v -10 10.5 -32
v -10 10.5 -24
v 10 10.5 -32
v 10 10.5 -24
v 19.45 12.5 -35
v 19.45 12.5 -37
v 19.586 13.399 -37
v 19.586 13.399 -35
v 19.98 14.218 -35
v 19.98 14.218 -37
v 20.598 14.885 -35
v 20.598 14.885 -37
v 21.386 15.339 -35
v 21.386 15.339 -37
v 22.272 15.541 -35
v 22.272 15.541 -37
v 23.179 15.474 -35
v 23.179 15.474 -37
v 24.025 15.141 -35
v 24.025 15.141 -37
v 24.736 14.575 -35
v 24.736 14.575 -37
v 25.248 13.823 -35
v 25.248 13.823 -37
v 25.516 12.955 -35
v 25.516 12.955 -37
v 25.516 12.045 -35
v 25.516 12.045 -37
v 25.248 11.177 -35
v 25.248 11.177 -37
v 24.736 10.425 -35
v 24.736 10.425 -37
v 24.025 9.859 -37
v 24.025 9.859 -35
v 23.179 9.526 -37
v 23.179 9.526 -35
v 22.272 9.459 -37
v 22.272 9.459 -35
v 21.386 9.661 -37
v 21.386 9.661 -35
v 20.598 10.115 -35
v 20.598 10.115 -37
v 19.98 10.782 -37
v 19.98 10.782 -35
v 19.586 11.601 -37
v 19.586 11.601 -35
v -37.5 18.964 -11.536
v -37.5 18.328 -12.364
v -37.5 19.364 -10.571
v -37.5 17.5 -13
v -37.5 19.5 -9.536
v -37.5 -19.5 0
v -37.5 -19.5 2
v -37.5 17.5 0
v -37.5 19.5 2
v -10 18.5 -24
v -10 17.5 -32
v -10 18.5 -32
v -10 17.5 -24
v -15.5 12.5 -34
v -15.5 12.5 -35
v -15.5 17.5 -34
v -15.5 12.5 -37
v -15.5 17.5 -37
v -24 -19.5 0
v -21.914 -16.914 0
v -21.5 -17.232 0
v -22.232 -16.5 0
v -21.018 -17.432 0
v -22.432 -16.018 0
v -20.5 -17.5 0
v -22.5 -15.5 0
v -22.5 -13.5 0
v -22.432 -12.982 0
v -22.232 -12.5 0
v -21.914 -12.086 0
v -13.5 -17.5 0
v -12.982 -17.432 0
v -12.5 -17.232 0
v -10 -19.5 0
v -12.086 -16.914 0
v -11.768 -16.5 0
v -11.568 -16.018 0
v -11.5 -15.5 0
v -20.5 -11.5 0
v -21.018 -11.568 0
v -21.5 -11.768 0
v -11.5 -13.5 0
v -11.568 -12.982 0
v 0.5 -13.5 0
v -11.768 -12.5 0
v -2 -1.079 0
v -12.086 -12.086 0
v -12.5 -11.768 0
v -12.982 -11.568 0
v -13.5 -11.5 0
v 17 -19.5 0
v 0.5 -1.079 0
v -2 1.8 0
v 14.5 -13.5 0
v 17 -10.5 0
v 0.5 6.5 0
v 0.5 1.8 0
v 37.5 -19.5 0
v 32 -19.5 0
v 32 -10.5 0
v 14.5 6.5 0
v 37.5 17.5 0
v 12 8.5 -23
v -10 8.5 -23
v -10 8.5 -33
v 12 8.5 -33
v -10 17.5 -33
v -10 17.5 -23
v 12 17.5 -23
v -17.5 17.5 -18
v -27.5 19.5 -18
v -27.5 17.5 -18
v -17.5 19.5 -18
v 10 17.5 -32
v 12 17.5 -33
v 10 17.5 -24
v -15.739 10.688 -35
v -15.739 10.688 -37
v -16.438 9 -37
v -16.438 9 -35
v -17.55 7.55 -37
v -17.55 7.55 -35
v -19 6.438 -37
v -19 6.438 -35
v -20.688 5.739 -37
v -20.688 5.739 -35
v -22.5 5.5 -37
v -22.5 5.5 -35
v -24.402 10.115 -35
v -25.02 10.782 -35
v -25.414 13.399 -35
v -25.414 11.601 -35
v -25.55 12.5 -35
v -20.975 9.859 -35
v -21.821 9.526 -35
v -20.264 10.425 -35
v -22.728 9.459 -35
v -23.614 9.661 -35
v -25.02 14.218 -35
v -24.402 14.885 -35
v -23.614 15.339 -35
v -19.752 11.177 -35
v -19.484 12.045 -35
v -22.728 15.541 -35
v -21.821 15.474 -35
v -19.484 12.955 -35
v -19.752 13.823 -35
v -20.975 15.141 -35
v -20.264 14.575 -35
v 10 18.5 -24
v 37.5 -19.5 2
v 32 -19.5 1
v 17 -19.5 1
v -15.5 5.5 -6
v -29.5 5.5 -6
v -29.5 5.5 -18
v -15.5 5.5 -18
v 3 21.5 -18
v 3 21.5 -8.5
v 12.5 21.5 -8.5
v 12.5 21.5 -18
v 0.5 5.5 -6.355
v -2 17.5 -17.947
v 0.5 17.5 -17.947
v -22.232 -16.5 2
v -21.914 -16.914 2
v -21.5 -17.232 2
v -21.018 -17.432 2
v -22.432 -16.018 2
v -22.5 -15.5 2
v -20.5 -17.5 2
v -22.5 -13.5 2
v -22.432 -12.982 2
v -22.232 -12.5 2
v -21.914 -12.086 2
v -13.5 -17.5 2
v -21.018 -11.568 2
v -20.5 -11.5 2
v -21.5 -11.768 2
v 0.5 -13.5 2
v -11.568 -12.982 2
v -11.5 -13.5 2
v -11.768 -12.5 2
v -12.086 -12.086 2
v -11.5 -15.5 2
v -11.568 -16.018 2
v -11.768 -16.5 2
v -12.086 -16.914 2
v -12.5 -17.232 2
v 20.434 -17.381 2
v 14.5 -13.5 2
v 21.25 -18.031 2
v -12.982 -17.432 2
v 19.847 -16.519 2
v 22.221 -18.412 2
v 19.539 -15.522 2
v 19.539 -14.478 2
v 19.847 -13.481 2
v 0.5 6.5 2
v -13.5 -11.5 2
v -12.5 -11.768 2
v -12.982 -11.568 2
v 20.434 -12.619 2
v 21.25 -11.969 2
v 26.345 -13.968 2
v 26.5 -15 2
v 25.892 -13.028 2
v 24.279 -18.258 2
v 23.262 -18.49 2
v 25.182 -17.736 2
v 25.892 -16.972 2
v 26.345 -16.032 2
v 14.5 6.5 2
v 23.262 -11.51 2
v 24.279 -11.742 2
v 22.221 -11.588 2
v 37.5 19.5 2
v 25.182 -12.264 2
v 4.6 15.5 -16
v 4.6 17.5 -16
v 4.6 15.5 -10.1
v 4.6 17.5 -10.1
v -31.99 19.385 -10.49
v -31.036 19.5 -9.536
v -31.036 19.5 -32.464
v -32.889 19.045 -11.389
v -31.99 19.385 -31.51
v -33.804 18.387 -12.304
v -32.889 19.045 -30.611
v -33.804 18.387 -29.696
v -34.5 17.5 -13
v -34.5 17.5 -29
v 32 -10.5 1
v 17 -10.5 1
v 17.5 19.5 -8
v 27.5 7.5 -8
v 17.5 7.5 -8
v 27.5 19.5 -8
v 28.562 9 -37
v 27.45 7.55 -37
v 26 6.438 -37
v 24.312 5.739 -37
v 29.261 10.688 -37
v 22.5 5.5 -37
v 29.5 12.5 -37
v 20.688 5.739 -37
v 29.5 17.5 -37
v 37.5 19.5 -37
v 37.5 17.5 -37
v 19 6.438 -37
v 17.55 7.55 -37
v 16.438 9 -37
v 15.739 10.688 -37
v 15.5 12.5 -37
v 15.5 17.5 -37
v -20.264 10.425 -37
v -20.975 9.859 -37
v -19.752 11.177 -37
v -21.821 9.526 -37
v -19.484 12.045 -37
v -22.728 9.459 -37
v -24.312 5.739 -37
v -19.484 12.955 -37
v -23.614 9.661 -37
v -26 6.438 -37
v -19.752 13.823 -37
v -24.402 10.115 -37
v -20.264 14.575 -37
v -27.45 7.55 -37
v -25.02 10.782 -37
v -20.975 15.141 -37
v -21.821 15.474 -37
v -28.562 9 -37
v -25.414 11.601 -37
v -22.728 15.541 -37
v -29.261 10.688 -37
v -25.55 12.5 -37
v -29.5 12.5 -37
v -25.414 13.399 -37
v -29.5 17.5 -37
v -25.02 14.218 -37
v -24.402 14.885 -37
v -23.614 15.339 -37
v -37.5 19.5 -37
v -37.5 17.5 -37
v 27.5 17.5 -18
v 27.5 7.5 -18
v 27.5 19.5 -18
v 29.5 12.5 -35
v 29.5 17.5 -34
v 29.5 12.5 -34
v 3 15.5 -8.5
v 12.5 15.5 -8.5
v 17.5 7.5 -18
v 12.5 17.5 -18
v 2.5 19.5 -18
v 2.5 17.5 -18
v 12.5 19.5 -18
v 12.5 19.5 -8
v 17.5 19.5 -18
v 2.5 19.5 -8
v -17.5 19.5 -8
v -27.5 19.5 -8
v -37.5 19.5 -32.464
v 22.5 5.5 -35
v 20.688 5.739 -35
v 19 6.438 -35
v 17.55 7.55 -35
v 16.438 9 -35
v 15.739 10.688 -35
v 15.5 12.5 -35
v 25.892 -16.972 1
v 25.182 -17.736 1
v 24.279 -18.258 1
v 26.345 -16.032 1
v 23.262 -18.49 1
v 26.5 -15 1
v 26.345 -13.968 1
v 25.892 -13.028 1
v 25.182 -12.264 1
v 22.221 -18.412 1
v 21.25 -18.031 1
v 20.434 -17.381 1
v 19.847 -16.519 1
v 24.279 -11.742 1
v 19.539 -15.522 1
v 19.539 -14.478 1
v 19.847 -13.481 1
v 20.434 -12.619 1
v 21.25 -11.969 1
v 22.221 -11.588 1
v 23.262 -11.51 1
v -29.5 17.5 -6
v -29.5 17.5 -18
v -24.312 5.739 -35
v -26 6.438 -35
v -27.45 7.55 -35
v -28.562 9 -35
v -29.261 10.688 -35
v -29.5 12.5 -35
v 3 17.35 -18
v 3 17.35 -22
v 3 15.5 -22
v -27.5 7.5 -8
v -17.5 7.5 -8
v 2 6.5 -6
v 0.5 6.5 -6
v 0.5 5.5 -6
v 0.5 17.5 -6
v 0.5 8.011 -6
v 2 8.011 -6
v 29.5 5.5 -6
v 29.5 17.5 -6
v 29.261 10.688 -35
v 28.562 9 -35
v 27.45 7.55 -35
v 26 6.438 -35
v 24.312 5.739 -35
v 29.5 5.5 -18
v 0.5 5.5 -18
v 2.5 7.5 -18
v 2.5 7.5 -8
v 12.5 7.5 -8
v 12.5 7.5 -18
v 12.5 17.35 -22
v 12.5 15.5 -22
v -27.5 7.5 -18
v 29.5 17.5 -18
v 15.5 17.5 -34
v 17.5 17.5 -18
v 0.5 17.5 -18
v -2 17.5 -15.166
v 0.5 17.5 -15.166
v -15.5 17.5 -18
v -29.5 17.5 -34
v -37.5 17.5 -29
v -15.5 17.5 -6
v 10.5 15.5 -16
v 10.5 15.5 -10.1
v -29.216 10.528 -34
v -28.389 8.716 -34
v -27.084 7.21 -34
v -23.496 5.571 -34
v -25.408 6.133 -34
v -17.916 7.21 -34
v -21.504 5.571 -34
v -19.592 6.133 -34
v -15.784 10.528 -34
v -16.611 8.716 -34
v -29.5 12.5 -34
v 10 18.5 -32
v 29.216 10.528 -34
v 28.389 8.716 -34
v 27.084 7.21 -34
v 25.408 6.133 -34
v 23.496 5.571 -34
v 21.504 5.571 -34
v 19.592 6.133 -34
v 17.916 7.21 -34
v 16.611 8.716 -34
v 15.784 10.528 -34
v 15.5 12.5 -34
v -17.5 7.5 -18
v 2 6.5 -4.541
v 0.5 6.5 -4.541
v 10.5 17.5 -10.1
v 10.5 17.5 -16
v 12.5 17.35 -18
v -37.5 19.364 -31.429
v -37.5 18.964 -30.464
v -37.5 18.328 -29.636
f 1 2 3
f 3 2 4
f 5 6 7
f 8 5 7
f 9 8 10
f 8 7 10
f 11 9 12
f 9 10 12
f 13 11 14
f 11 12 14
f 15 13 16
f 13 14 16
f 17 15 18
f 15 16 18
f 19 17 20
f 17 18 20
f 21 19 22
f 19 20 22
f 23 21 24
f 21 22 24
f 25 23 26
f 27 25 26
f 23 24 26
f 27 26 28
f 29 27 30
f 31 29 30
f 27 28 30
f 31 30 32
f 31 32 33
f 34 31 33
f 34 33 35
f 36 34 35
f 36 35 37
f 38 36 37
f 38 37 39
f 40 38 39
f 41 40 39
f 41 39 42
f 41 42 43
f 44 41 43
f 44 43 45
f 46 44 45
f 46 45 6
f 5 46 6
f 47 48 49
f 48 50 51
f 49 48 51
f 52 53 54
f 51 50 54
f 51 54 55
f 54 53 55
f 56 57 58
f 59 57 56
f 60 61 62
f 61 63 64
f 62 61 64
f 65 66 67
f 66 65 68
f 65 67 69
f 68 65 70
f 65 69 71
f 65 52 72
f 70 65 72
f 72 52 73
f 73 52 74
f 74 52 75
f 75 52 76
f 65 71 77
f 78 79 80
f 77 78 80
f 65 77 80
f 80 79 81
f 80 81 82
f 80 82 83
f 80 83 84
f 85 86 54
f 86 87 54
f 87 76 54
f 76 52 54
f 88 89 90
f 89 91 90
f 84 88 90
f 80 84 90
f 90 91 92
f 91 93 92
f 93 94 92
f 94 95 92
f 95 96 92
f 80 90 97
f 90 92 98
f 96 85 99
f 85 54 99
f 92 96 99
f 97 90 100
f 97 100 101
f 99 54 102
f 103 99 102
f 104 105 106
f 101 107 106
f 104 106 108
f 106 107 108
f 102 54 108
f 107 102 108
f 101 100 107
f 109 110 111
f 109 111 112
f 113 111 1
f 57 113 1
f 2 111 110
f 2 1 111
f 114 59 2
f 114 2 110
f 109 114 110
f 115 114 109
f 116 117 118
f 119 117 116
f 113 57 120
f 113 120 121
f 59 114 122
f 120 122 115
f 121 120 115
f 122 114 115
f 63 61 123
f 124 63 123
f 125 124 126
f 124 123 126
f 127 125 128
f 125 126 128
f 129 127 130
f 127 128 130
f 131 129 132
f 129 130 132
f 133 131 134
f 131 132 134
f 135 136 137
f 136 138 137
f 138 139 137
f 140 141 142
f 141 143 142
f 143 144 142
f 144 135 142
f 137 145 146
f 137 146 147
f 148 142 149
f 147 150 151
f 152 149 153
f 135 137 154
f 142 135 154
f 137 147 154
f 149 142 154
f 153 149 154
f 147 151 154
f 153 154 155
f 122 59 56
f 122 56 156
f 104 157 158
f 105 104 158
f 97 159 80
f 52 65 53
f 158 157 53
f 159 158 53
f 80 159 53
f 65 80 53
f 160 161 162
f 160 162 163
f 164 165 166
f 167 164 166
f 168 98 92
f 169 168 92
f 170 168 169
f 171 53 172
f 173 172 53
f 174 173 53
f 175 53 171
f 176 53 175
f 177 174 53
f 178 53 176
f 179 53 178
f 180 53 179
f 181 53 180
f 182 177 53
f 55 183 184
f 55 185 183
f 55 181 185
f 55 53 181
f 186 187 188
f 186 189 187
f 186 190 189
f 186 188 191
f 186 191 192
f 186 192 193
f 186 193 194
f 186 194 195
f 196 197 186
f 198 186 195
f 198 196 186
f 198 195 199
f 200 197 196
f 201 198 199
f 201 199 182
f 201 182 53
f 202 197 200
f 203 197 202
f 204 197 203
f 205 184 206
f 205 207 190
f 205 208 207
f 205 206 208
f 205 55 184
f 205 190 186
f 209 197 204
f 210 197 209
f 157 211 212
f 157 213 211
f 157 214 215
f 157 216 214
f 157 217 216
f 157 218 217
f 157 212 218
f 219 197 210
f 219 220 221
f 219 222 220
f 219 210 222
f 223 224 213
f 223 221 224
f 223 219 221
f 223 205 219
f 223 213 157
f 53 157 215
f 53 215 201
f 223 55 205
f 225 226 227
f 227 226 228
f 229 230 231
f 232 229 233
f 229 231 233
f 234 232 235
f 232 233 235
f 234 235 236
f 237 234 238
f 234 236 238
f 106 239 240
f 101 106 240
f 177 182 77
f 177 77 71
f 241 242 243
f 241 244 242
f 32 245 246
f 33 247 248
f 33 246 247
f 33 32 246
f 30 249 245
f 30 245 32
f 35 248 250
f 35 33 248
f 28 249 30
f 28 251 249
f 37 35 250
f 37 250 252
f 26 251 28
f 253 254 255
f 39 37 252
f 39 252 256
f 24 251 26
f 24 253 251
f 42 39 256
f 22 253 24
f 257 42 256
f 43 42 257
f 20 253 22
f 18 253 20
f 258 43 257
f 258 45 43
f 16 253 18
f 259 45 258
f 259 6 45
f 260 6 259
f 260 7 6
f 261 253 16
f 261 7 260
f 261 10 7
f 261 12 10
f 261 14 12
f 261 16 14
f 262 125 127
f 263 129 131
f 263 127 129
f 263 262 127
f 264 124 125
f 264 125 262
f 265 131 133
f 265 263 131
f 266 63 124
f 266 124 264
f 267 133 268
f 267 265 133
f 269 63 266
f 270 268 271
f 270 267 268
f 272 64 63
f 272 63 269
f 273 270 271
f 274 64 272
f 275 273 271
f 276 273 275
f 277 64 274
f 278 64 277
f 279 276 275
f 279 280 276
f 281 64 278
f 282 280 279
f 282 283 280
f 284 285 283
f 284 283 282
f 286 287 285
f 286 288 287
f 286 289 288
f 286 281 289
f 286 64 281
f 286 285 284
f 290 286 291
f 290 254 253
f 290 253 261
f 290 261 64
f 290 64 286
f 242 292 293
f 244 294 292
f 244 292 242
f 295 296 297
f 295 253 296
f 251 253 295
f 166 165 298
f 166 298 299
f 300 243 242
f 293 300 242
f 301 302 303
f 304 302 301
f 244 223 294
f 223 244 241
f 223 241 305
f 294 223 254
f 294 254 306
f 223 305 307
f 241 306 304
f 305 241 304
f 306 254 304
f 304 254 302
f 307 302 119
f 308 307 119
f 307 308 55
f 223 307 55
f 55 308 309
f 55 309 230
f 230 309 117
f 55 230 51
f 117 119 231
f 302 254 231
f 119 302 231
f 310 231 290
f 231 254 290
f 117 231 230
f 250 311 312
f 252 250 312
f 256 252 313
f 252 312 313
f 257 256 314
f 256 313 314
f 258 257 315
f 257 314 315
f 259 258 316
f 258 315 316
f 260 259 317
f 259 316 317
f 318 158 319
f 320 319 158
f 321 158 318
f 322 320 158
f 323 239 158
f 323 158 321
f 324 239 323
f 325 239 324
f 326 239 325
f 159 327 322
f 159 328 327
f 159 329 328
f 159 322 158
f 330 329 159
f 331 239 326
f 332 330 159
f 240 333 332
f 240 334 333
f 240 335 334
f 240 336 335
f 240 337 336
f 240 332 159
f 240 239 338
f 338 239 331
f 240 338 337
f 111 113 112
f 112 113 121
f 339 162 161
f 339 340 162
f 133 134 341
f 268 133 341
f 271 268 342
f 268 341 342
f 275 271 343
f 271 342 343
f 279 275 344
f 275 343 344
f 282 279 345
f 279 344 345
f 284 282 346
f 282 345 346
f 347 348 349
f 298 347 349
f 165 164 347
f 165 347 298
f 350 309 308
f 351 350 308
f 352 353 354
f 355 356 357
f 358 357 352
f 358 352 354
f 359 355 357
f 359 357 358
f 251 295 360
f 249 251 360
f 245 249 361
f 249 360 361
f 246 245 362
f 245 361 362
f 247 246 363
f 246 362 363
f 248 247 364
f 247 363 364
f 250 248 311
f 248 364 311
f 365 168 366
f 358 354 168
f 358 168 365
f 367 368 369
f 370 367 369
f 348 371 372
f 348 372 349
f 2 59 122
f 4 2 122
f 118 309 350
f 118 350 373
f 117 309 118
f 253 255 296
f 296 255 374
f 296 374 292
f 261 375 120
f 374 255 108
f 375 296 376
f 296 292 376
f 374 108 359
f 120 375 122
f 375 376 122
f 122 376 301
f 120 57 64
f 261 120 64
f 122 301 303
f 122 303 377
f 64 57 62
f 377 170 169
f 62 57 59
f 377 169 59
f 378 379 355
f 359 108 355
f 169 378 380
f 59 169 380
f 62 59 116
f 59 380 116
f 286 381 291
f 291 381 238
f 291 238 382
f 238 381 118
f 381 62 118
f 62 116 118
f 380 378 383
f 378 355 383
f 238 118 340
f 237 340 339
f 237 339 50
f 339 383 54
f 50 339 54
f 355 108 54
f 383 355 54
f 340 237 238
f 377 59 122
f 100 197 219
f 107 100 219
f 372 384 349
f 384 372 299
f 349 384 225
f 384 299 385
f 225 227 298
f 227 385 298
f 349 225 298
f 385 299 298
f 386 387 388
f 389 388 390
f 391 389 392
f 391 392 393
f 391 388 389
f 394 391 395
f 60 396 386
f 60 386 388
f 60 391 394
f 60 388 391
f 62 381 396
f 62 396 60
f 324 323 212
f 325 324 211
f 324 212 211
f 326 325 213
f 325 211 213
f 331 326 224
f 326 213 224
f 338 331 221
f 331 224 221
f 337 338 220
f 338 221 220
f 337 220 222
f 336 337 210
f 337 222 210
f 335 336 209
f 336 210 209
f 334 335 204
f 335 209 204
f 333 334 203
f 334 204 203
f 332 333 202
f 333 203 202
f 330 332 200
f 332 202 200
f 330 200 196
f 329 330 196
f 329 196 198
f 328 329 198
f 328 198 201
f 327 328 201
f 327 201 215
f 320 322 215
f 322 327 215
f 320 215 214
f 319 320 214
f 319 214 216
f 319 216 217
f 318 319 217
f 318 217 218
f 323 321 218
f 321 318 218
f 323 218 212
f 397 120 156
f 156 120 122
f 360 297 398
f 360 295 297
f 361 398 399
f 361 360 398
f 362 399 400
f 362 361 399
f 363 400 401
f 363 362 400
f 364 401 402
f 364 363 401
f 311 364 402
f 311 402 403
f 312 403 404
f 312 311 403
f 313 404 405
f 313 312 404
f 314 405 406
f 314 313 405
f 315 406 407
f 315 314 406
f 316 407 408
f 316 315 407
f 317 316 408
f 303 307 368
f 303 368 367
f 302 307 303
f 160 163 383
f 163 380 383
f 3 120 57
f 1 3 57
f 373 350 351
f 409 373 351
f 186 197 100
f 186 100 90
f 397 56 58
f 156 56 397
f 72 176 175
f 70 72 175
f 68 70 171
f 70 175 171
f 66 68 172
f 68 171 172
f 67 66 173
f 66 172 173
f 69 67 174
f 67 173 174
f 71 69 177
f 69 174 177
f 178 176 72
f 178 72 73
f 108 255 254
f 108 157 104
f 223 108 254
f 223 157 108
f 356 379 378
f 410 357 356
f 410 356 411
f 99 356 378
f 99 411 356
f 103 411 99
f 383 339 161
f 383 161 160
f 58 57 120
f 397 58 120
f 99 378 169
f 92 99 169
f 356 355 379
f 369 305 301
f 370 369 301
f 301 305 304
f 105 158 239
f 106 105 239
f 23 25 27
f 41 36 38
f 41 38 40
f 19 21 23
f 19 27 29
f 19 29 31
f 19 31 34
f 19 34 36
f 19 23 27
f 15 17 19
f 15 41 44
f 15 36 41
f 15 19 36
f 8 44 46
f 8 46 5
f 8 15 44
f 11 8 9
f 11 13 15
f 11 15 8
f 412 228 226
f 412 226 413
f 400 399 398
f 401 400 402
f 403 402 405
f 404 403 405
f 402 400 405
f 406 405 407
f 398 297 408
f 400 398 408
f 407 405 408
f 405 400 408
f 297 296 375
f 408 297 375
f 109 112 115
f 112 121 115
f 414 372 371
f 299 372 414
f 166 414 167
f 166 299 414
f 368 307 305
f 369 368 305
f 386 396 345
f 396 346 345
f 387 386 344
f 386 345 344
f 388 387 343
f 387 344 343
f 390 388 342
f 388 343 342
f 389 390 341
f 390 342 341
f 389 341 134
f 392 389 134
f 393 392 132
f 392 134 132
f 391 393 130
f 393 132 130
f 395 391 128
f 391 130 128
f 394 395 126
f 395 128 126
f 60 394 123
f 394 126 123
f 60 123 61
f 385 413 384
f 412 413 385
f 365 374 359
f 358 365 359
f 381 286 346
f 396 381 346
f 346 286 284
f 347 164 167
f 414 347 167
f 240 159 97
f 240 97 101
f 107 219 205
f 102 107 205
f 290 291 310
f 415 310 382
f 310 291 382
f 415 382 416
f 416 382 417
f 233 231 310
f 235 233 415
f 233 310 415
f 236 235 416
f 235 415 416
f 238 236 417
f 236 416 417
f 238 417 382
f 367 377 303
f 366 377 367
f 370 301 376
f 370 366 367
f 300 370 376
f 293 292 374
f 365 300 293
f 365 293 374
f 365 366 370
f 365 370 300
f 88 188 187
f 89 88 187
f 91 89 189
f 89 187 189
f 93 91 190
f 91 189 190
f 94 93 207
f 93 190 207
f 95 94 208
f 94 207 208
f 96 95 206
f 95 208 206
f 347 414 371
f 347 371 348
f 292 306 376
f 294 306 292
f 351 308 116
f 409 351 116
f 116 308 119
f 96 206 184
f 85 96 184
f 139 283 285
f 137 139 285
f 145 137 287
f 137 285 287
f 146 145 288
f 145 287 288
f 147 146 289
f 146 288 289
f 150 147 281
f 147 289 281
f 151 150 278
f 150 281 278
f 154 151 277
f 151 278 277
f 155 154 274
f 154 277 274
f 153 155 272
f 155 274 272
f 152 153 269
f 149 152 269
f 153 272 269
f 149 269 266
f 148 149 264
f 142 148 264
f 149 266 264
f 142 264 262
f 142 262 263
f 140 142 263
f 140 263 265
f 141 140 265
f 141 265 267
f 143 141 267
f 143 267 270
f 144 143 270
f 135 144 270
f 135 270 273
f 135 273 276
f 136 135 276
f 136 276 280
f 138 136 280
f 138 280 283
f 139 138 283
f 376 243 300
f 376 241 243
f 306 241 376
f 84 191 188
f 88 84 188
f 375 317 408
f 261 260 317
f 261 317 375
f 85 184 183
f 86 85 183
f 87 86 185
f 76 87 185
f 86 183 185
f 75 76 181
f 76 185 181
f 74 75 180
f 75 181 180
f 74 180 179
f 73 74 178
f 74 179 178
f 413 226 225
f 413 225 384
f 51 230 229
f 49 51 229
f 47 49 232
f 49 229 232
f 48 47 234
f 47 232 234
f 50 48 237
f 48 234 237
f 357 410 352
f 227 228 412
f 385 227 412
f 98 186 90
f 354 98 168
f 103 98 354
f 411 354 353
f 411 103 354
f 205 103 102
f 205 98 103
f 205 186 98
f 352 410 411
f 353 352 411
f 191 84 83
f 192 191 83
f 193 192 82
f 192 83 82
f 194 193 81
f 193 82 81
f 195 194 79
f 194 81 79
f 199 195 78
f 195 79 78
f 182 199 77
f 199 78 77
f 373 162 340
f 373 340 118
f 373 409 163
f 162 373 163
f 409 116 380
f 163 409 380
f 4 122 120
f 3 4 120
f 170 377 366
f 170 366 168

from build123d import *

# Parameters (mm, degrees)
SKETCH1_W                 = 75
SKETCH1_H                 = 39
BOSS_EXTRUDE1_DEPTH       = 2
SKETCH2_W                 = 75
SKETCH2_H                 = 2
BOSS_EXTRUDE2_DEPTH       = 38
SKETCH4_R                 = 3.5
SKETCH4_R_2               = 2.25
SKETCH4_W                 = 11
SKETCH4_H                 = 6
CUT_EXTRUDE1_DEPTH        = 2
SKETCH6_W                 = 10
SKETCH6_H                 = 10
CUT_EXTRUDE2_DEPTH        = 2
BOSS_EXTRUDE3_DEPTH       = 10
SKETCH8_W                 = 14
SKETCH8_H                 = 12
BOSS_EXTRUDE4_DEPTH       = 2
SKETCH9_W                 = 10
SKETCH9_H                 = 10
BOSS_EXTRUDE5_DEPTH       = 4
SKETCH10_W                = 9.9
SKETCH10_H                = 9.9
SKETCH10_W_2              = 5.9
SKETCH10_H_2              = 5.9
BOSS_EXTRUDE9_DEPTH       = 2
SKETCH11_W                = 9.9
SKETCH11_H                = 1.85
BOSS_EXTRUDE10_DEPTH      = 4
SKETCH12_R                = 4.25
SKETCH12_R_2              = 2.25
BOSS_EXTRUDE11_DEPTH      = 2
SKETCH16_W                = 14
SKETCH16_H                = 9.5
SKETCH16_W_2              = 11
SKETCH16_H_2              = 6
BOSS_EXTRUDE13_DEPTH      = 2
CUT_EXTRUDE3_DEPTH        = 65.955754172
FILLET1_R                 = 2
FILLET2_R                 = 2
BOSS_EXTRUDE14_DEPTH      = 2
BOSS_EXTRUDE14_DEPTH_BACK = 2
CUT_EXTRUDE4_DEPTH        = 7
CUT_EXTRUDE4_DEPTH_BACK   = 10
SKETCH19_W                = 14
SKETCH19_H                = 20
SKETCH22_W                = 14
SKETCH22_H                = 14
BOSS_EXTRUDE15_DEPTH      = 3
FILLET3_R                 = 7
SKETCH23_R                = 3.05
CUT_EXTRUDE6_DEPTH        = 4
SKETCH24_W                = 1
SKETCH24_H                = 12
BOSS_EXTRUDE16_DEPTH      = 12
SKETCH25_W                = 16.318850604
SKETCH25_H                = 8.975597068
SKETCH25_W_2              = 14
SKETCH25_H_2              = 9.692484115
CUT_EXTRUDE7_DEPTH        = 2
CUT_EXTRUDE8_START        = -2
SKETCH26_R                = 4.25
CUT_EXTRUDE8_DEPTH        = 2
SKETCH27_R                = 2.25
BOSS_EXTRUDE17_DEPTH      = 2
SKETCH28_W                = 85.525995753
SKETCH28_H                = 26.786934063
CUT_EXTRUDE9_DEPTH        = 1
BOSS_EXTRUDE18_DEPTH      = 1
CUT_EXTRUDE10_DEPTH       = 10
CUT_EXTRUDE11_START       = -1
SKETCH31_W                = 15
SKETCH31_H                = 9
SKETCH31_R                = 3.5
CUT_EXTRUDE11_DEPTH       = 1
SKETCH32_W                = 20
SKETCH32_H                = 8
CUT_EXTRUDE12_DEPTH       = 1
BOSS_EXTRUDE19_START      = -1
SKETCH34_W                = 14
SKETCH34_H                = 1
BOSS_EXTRUDE19_DEPTH      = 1
SKETCH35_W                = 3
SKETCH35_H                = 16
CUT_EXTRUDE13_DEPTH       = 66.545785524
FILLET4_R                 = 4
SKETCH36_W                = 0.4
SKETCH36_H                = 4
CUT_EXTRUDE14_DEPTH       = 10
BOSS_EXTRUDE20_DEPTH      = 7
SKETCH38_W                = 22
SKETCH38_H                = 10
BOSS_EXTRUDE21_DEPTH      = 2


# Some blends are built 0.0001 mm under size
with BuildPart() as part:
    # Sketch1 → Boss-Extrude1 (new body)
    with BuildSketch(Plane.XY):
        Rectangle(SKETCH1_W, SKETCH1_H)
    extrude(amount=BOSS_EXTRUDE1_DEPTH)

    # Sketch2 → Boss-Extrude2 (add)
    with BuildSketch(Plane(origin=(0, 0, 0), x_dir=(-1, 0, 0), z_dir=(0, 0, -1))):
        with Locations((0, 18.5)):
            Rectangle(SKETCH2_W, SKETCH2_H)
    extrude(amount=BOSS_EXTRUDE2_DEPTH)

    # Sketch4 → Cut-Extrude1 (cut)
    with BuildSketch(Plane.XY.offset(2)):
        with Locations((23, -15)):
            Circle(SKETCH4_R)
        with Locations((23, 4.5)):
            Circle(SKETCH4_R_2)
        with Locations((-17, -14.5)):
            Rectangle(SKETCH4_W, SKETCH4_H)
    extrude(amount=-CUT_EXTRUDE1_DEPTH, mode=Mode.SUBTRACT)

    # Sketch6 → Cut-Extrude2 (cut)
    with BuildSketch(Plane(origin=(0, 19.5, 0), x_dir=(1, 0, 0), z_dir=(0, 1, 0))):
        with Locations((7.5, 13)):
            Rectangle(SKETCH6_W, SKETCH6_H)
        with Locations((22.5, 13)):
            Rectangle(SKETCH6_W, SKETCH6_H)
        with Locations((-22.5, 13)):
            Rectangle(SKETCH6_W, SKETCH6_H)
    extrude(amount=-CUT_EXTRUDE2_DEPTH, mode=Mode.SUBTRACT)

    # Sketch7 → Boss-Extrude3 (add)
    with BuildSketch(Plane.XZ.offset(-17.5)):
        Polygon((17.5, -8), (17.5, -18), (15.5, -18), (15.5, -8), (15.5, -6), (29.5, -6), (29.5, -8), (29.5, -18), (27.5, -18), (27.5, -8), align=None)
        Polygon((2.5, -8), (2.5, -18), (0.5, -18), (0.5, -8), (0.5, -6), (14.5, -6), (14.5, -8), (14.5, -18), (12.5, -18), (12.5, -8), align=None)
        Polygon((-17.5, -8), (-17.5, -18), (-15.5, -18), (-15.5, -8), (-15.5, -6), (-29.5, -6), (-29.5, -8), (-29.5, -18), (-27.5, -18), (-27.5, -8), align=None)
    extrude(amount=BOSS_EXTRUDE3_DEPTH)

    # Sketch8 → Boss-Extrude4 (add)
    with BuildSketch(Plane.XZ.offset(-7.5)):
        with Locations((-22.5, -12)):
            Rectangle(SKETCH8_W, SKETCH8_H)
        with Locations((7.5, -12)):
            Rectangle(SKETCH8_W, SKETCH8_H)
        with Locations((22.5, -12)):
            Rectangle(SKETCH8_W, SKETCH8_H)
    extrude(amount=BOSS_EXTRUDE4_DEPTH)

    # Sketch12 → Boss-Extrude11 (add)
    with BuildSketch(Plane(origin=(0, 0, 0), x_dir=(-1, 0, 0), z_dir=(0, 0, -1))):
        with Locations(Location((-23, 4.5, 0), (0, 0, 180))):
            Circle(SKETCH12_R)
        with Locations(Location((-23, 4.5, 0), (0, 0, 180))):
            Circle(SKETCH12_R_2, mode=Mode.SUBTRACT)
    extrude(amount=BOSS_EXTRUDE11_DEPTH)

    # Sketch16 → Boss-Extrude13 (add)
    with BuildSketch(Plane(origin=(0, 0, 0), x_dir=(-1, 0, 0), z_dir=(0, 0, -1))):
        with Locations((17, -14.75)):
            Rectangle(SKETCH16_W, SKETCH16_H)
        with Locations((17, -14.5)):
            Rectangle(SKETCH16_W_2, SKETCH16_H_2, mode=Mode.SUBTRACT)
    extrude(amount=BOSS_EXTRUDE13_DEPTH)

    # Fillet1
    fillet1_edges = [part.edges().sort_by_distance(p)[0] for p in [
        (-22.5, -17.5, 0),
        (-22.5, -11.5, 0),
        (-11.5, -11.5, 0),
        (-11.5, -17.5, 0),
    ]]
    fillet(fillet1_edges, radius=FILLET1_R)

    # Fillet2
    fillet2_edges = [part.edges().sort_by_distance(p)[0] for p in [
        (-10, -10, -1),
        (-24, -10, -1),
    ]]
    fillet(fillet2_edges, radius=FILLET2_R)

    # Sketch18 → Boss-Extrude14 (add, two sides: drawn at the far end of the back side and taken through both)
    with BuildSketch(Plane.ZY.offset(-BOSS_EXTRUDE14_DEPTH_BACK)):
        Polygon((-15.16634768, 17.5), (0, 1.799618541), (0, -1.079036274), (-17.947087746, 17.5), align=None)
    extrude(amount=BOSS_EXTRUDE14_DEPTH + BOSS_EXTRUDE14_DEPTH_BACK)

    # Sketch19 → Cut-Extrude4 (cut, two sides: drawn at the far end of the back side and taken through both)
    with BuildSketch(Plane(origin=(0, 0, 0), x_dir=(-1, 0, 0), z_dir=(0, 0, -1)).offset(-CUT_EXTRUDE4_DEPTH_BACK)):
        with Locations((-7.5, -3.5)):
            Rectangle(SKETCH19_W, SKETCH19_H)
    extrude(amount=CUT_EXTRUDE4_DEPTH + CUT_EXTRUDE4_DEPTH_BACK, mode=Mode.SUBTRACT)

    # Sketch22 → Boss-Extrude15 (add)
    with BuildSketch(Plane(origin=(0, 0, -38), x_dir=(-1, 0, 0), z_dir=(0, 0, -1))):
        with Locations((-22.5, 12.5)):
            Rectangle(SKETCH22_W, SKETCH22_H)
        with Locations((22.5, 12.5)):
            Rectangle(SKETCH22_W, SKETCH22_H)
    extrude(amount=-BOSS_EXTRUDE15_DEPTH)

    # Fillet3
    fillet3_edges = [part.edges().sort_by_distance(p)[0] for p in [
        (-29.5, 5.5, -36.5),
        (-15.5, 5.5, -36.5),
        (15.5, 5.5, -36.5),
        (29.5, 5.5, -36.5),
    ]]
    fillet(fillet3_edges, radius=FILLET3_R - 0.0001)  # a hair under: the kernel refuses the full size

    # Sketch23 → Cut-Extrude6 (cut)
    with BuildSketch(Plane(origin=(0, 0, -38), x_dir=(-1, 0, 0), z_dir=(0, 0, -1))):
        with Locations((-22.5, 12.5)):
            Circle(SKETCH23_R)
        with Locations((22.5, 12.5)):
            Circle(SKETCH23_R)
    extrude(amount=-CUT_EXTRUDE6_DEPTH, mode=Mode.SUBTRACT)

    # Sketch24 → Boss-Extrude16 (add)
    with BuildSketch(Plane.XZ.offset(-5.5)):
        with Locations((15, -12)):
            Rectangle(SKETCH24_W, SKETCH24_H)
    extrude(amount=-BOSS_EXTRUDE16_DEPTH)

    # Sketch25 → Cut-Extrude7 (cut)
    with BuildSketch(Plane(origin=(0, 0, -2), x_dir=(-1, 0, 0), z_dir=(0, 0, -1))):
        with Locations((-23, -15)):
            Rectangle(SKETCH25_W, SKETCH25_H)
        with Locations((17, -14.653757943)):
            Rectangle(SKETCH25_W_2, SKETCH25_H_2)
    extrude(amount=-CUT_EXTRUDE7_DEPTH, mode=Mode.SUBTRACT)

    # Sketch26 → Cut-Extrude8 (cut)
    with BuildSketch(Plane(origin=(0, 0, -2), x_dir=(-1, 0, 0), z_dir=(0, 0, -1)).offset(CUT_EXTRUDE8_START)):
        with Locations((-23, 4.5)):
            Circle(SKETCH26_R)
    extrude(amount=CUT_EXTRUDE8_DEPTH, mode=Mode.SUBTRACT)

    # Sketch27 → Boss-Extrude17 (add)
    with BuildSketch(Plane.XY.offset(2)):
        with Locations((23, 4.5)):
            Circle(SKETCH27_R)
    extrude(amount=-BOSS_EXTRUDE17_DEPTH)

    # Sketch28 → Cut-Extrude9 (cut)
    with BuildSketch(Plane(origin=(0, 0, -38), x_dir=(-1, 0, 0), z_dir=(0, 0, -1))):
        with Locations((0.270543114, 11.591218851)):
            Rectangle(SKETCH28_W, SKETCH28_H)
    extrude(amount=-CUT_EXTRUDE9_DEPTH, mode=Mode.SUBTRACT)

    # Sketch29 → Boss-Extrude18 (add)
    with BuildSketch(Plane.XY.offset(-35)):
        with BuildLine():
            Line((15.5, 17.5), (29.5, 17.5))
            Line((29.5, 17.5), (29.5, 12.5))
            ThreePointArc((29.5, 12.5), (22.5, 5.5), (15.5, 12.5))
            Line((15.5, 12.5), (15.5, 17.5))
        make_face()
    boss_extrude18 = extrude(amount=BOSS_EXTRUDE18_DEPTH)

    # Mirror1: Boss-Extrude18 across plane
    add(boss_extrude18.mirror(Plane.ZY))

    # Sketch31 → Cut-Extrude11 (cut)
    with BuildSketch(Plane(origin=(0, 0, 0), x_dir=(-1, 0, 0), z_dir=(0, 0, -1)).offset(CUT_EXTRUDE11_START)):
        with Locations((-24.5, -15)):
            Rectangle(SKETCH31_W, SKETCH31_H)
        with Locations(Location((-23, -15, 0), (0, 0, 180))):
            Circle(SKETCH31_R, mode=Mode.SUBTRACT)
    extrude(amount=CUT_EXTRUDE11_DEPTH, mode=Mode.SUBTRACT)

    # Sketch32 → Cut-Extrude12 (cut)
    with BuildSketch(Plane.XZ.offset(-17.5)):
        with Locations((0, -28)):
            Rectangle(SKETCH32_W, SKETCH32_H)
    extrude(amount=-CUT_EXTRUDE12_DEPTH, mode=Mode.SUBTRACT)

    # Sketch34 → Boss-Extrude19 (add)
    with BuildSketch(Plane.XZ.offset(-5.5).offset(BOSS_EXTRUDE19_START)):
        with Locations((7.5, -6.5)):
            Rectangle(SKETCH34_W, SKETCH34_H)
    extrude(amount=BOSS_EXTRUDE19_DEPTH)

    # Sketch35 → Cut-Extrude13 (cut, through all)
    with BuildSketch(Plane(origin=(0, 19.5, 0), x_dir=(1, 0, 0), z_dir=(0, 1, 0))):
        with Locations((-36, 21)):
            Rectangle(SKETCH35_W, SKETCH35_H)
    extrude(amount=-CUT_EXTRUDE13_DEPTH, mode=Mode.SUBTRACT)

    # Fillet4
    # the kernel refuses this fillet: 4 mm, written as the material it takes off along each edge
    with BuildSketch(Plane(origin=(-34.5, 19.5, -13), x_dir=(0, 0, 1), z_dir=(-1, 0, 0)), Plane(origin=(-46.160254038, 19.5, -29), x_dir=(0, 0, -1), z_dir=(1, 0, 0))) as fillet4_piece_1:
        with BuildLine():
            CenterArc((3.464101615, -4), FILLET4_R, 90, 60)
            Line((0, -2), (-0.069282032, -1.96))
            ThreePointArc((-0.069282032, -1.96), (-0.08, -1), (-0.08, 0))
            Line((-0.08, 0), (0, 0.08))
            Line((0, 0.08), (3.464101615, 0.08))
            Line((3.464101615, 0.08), (3.464101615, 0))
        make_face()
    extrude(amount=11.660254038, mode=Mode.SUBTRACT)
    with BuildSketch(Plane(origin=(-34.5, 19.5, -29), x_dir=(1, 0, 0), z_dir=(0, 0, 1))) as fillet4_piece_2:
        with BuildLine():
            CenterArc((3.464101615, -4), FILLET4_R, 90, 60)
            Line((0, -2), (-0.069282032, -1.96))
            ThreePointArc((-0.069282032, -1.96), (-0.08, -1), (-0.08, 0))
            Line((-0.08, 0), (0, 0.08))
            Line((0, 0.08), (3.464101615, 0.08))
            Line((3.464101615, 0.08), (3.464101615, 0))
        make_face()
    extrude(amount=16, mode=Mode.SUBTRACT)
    with BuildSketch(Plane(origin=(-25.839745962, 19.5, -13), x_dir=(0, 0, 1), z_dir=(-1, 0, 0))) as fillet4_piece_3a_section:
        with BuildLine():
            CenterArc((3.464101615, -4), FILLET4_R, 90, 60)
            Line((0, -2), (-0.069282032, -1.96))
            ThreePointArc((-0.069282032, -1.96), (-0.08, -1), (-0.08, 0))
            Line((-0.08, 0), (0, 0.08))
            Line((0, 0.08), (3.464101615, 0.08))
            Line((3.464101615, 0.08), (3.464101615, 0))
        make_face()
    fillet4_piece_3a = extrude(amount=20.320508076, mode=Mode.PRIVATE)
    fillet4_piece_3a = split(fillet4_piece_3a, bisect_by=Plane(origin=(-34.5, 18.981933156, -12.134758217), z_dir=(1, 0, 0)), keep=Keep.TOP, mode=Mode.PRIVATE)
    with BuildSketch(Plane(origin=(-34.5, 19.5, -29), x_dir=(1, 0, 0), z_dir=(0, 0, 1))) as fillet4_piece_3b_section:
        with BuildLine():
            CenterArc((3.464101615, -4), FILLET4_R, 90, 60)
            Line((0, -2), (-0.069282032, -1.96))
            ThreePointArc((-0.069282032, -1.96), (-0.08, -1), (-0.08, 0))
            Line((-0.08, 0), (0, 0.08))
            Line((0, 0.08), (3.464101615, 0.08))
            Line((3.464101615, 0.08), (3.464101615, 0))
        make_face()
    fillet4_piece_3b = extrude(amount=24.660254038, mode=Mode.PRIVATE)
    fillet4_piece_3b = split(fillet4_piece_3b, bisect_by=Plane(origin=(-33.634758217, 18.981933156, -13), z_dir=(0, 0, 1)), keep=Keep.TOP, mode=Mode.PRIVATE)
    fillet4_piece_3 = fillet4_piece_3a & fillet4_piece_3b
    add(fillet4_piece_3, mode=Mode.SUBTRACT)
    with BuildSketch(Plane(origin=(-34.5, 19.5, -37.660254038), x_dir=(1, 0, 0), z_dir=(0, 0, 1))) as fillet4_piece_4a_section:
        with BuildLine():
            CenterArc((3.464101615, -4), FILLET4_R, 90, 60)
            Line((0, -2), (-0.069282032, -1.96))
            ThreePointArc((-0.069282032, -1.96), (-0.08, -1), (-0.08, 0))
            Line((-0.08, 0), (0, 0.08))
            Line((0, 0.08), (3.464101615, 0.08))
            Line((3.464101615, 0.08), (3.464101615, 0))
        make_face()
    fillet4_piece_4a = extrude(amount=24.660254038, mode=Mode.PRIVATE)
    fillet4_piece_4a = split(fillet4_piece_4a, bisect_by=Plane(origin=(-33.634758217, 18.981933156, -29), z_dir=(0, 0, -1)), keep=Keep.TOP, mode=Mode.PRIVATE)
    with BuildSketch(Plane(origin=(-46.160254038, 19.5, -29), x_dir=(0, 0, -1), z_dir=(1, 0, 0))) as fillet4_piece_4b_section:
        with BuildLine():
            CenterArc((3.464101615, -4), FILLET4_R, 90, 60)
            Line((0, -2), (-0.069282032, -1.96))
            ThreePointArc((-0.069282032, -1.96), (-0.08, -1), (-0.08, 0))
            Line((-0.08, 0), (0, 0.08))
            Line((0, 0.08), (3.464101615, 0.08))
            Line((3.464101615, 0.08), (3.464101615, 0))
        make_face()
    fillet4_piece_4b = extrude(amount=20.320508076, mode=Mode.PRIVATE)
    fillet4_piece_4b = split(fillet4_piece_4b, bisect_by=Plane(origin=(-34.5, 18.981933156, -29.865241783), z_dir=(1, 0, 0)), keep=Keep.TOP, mode=Mode.PRIVATE)
    fillet4_piece_4 = fillet4_piece_4a & fillet4_piece_4b
    add(fillet4_piece_4, mode=Mode.SUBTRACT)


with BuildPart() as body_2:
    # Sketch9 → Boss-Extrude5 (new body)
    with BuildSketch(Plane.XZ.offset(-17.5)):
        with Locations((7.5, -13)):
            Rectangle(SKETCH9_W, SKETCH9_H)
    extrude(amount=-BOSS_EXTRUDE5_DEPTH)

    # Sketch10 → Boss-Extrude9 (add)
    with BuildSketch(Plane.XZ.offset(-17.5)):
        with Locations((7.55, -13.05)):
            Rectangle(SKETCH10_W, SKETCH10_H)
        with Locations((7.55, -13.05)):
            Rectangle(SKETCH10_W_2, SKETCH10_H_2, mode=Mode.SUBTRACT)
    extrude(amount=BOSS_EXTRUDE9_DEPTH)

    # Sketch11 → Boss-Extrude10 (add)
    with BuildSketch(Plane(origin=(0, 0, -18), x_dir=(-1, 0, 0), z_dir=(0, 0, -1))):
        with Locations((-7.55, 16.425)):
            Rectangle(SKETCH11_W, SKETCH11_H)
    extrude(amount=BOSS_EXTRUDE10_DEPTH)

    # Sketch17 → Cut-Extrude3 (cut, through all)
    with BuildSketch(Plane.XZ.offset(-17.5)):
        Polygon((2.5, -8.1), (2.5, -18), (2.6, -18), (2.6, -8.1), (12.5, -8.1), (12.5, -8), (2.6, -8), (2.5, -8), align=None)
    extrude(amount=-CUT_EXTRUDE3_DEPTH, mode=Mode.SUBTRACT)

    # Sketch30 → Cut-Extrude10 (cut)
    with BuildSketch(Plane(origin=(0, 21.5, 0), x_dir=(1, 0, 0), z_dir=(0, 1, 0))):
        Polygon((2.5, 18), (3, 18), (3, 8.5), (12.5, 8.5), (12.5, 8), (2.5, 8), align=None)
    extrude(amount=-CUT_EXTRUDE10_DEPTH, mode=Mode.SUBTRACT)

    # Sketch36 → Cut-Extrude14 (cut)
    with BuildSketch(Plane.XZ.offset(-15.5)):
        with Locations((2.8, -20)):
            Rectangle(SKETCH36_W, SKETCH36_H)
    extrude(amount=-CUT_EXTRUDE14_DEPTH, mode=Mode.SUBTRACT)


with BuildPart() as body_3:
    # Sketch37 → Boss-Extrude20 (new body)
    with BuildSketch(Plane.XZ.offset(-17.5)):
        Polygon((-10, -32), (-10, -33), (12, -33), (12, -23), (-10, -23), (-10, -24), (10, -24), (10, -32), align=None)
    extrude(amount=BOSS_EXTRUDE20_DEPTH)

    # Sketch38 → Boss-Extrude21 (add)
    with BuildSketch(Plane.XZ.offset(-10.5)):
        with Locations((1, -28)):
            Rectangle(SKETCH38_W, SKETCH38_H)
    extrude(amount=BOSS_EXTRUDE21_DEPTH)


solid = Compound([part.part, body_2.part, body_3.part])
